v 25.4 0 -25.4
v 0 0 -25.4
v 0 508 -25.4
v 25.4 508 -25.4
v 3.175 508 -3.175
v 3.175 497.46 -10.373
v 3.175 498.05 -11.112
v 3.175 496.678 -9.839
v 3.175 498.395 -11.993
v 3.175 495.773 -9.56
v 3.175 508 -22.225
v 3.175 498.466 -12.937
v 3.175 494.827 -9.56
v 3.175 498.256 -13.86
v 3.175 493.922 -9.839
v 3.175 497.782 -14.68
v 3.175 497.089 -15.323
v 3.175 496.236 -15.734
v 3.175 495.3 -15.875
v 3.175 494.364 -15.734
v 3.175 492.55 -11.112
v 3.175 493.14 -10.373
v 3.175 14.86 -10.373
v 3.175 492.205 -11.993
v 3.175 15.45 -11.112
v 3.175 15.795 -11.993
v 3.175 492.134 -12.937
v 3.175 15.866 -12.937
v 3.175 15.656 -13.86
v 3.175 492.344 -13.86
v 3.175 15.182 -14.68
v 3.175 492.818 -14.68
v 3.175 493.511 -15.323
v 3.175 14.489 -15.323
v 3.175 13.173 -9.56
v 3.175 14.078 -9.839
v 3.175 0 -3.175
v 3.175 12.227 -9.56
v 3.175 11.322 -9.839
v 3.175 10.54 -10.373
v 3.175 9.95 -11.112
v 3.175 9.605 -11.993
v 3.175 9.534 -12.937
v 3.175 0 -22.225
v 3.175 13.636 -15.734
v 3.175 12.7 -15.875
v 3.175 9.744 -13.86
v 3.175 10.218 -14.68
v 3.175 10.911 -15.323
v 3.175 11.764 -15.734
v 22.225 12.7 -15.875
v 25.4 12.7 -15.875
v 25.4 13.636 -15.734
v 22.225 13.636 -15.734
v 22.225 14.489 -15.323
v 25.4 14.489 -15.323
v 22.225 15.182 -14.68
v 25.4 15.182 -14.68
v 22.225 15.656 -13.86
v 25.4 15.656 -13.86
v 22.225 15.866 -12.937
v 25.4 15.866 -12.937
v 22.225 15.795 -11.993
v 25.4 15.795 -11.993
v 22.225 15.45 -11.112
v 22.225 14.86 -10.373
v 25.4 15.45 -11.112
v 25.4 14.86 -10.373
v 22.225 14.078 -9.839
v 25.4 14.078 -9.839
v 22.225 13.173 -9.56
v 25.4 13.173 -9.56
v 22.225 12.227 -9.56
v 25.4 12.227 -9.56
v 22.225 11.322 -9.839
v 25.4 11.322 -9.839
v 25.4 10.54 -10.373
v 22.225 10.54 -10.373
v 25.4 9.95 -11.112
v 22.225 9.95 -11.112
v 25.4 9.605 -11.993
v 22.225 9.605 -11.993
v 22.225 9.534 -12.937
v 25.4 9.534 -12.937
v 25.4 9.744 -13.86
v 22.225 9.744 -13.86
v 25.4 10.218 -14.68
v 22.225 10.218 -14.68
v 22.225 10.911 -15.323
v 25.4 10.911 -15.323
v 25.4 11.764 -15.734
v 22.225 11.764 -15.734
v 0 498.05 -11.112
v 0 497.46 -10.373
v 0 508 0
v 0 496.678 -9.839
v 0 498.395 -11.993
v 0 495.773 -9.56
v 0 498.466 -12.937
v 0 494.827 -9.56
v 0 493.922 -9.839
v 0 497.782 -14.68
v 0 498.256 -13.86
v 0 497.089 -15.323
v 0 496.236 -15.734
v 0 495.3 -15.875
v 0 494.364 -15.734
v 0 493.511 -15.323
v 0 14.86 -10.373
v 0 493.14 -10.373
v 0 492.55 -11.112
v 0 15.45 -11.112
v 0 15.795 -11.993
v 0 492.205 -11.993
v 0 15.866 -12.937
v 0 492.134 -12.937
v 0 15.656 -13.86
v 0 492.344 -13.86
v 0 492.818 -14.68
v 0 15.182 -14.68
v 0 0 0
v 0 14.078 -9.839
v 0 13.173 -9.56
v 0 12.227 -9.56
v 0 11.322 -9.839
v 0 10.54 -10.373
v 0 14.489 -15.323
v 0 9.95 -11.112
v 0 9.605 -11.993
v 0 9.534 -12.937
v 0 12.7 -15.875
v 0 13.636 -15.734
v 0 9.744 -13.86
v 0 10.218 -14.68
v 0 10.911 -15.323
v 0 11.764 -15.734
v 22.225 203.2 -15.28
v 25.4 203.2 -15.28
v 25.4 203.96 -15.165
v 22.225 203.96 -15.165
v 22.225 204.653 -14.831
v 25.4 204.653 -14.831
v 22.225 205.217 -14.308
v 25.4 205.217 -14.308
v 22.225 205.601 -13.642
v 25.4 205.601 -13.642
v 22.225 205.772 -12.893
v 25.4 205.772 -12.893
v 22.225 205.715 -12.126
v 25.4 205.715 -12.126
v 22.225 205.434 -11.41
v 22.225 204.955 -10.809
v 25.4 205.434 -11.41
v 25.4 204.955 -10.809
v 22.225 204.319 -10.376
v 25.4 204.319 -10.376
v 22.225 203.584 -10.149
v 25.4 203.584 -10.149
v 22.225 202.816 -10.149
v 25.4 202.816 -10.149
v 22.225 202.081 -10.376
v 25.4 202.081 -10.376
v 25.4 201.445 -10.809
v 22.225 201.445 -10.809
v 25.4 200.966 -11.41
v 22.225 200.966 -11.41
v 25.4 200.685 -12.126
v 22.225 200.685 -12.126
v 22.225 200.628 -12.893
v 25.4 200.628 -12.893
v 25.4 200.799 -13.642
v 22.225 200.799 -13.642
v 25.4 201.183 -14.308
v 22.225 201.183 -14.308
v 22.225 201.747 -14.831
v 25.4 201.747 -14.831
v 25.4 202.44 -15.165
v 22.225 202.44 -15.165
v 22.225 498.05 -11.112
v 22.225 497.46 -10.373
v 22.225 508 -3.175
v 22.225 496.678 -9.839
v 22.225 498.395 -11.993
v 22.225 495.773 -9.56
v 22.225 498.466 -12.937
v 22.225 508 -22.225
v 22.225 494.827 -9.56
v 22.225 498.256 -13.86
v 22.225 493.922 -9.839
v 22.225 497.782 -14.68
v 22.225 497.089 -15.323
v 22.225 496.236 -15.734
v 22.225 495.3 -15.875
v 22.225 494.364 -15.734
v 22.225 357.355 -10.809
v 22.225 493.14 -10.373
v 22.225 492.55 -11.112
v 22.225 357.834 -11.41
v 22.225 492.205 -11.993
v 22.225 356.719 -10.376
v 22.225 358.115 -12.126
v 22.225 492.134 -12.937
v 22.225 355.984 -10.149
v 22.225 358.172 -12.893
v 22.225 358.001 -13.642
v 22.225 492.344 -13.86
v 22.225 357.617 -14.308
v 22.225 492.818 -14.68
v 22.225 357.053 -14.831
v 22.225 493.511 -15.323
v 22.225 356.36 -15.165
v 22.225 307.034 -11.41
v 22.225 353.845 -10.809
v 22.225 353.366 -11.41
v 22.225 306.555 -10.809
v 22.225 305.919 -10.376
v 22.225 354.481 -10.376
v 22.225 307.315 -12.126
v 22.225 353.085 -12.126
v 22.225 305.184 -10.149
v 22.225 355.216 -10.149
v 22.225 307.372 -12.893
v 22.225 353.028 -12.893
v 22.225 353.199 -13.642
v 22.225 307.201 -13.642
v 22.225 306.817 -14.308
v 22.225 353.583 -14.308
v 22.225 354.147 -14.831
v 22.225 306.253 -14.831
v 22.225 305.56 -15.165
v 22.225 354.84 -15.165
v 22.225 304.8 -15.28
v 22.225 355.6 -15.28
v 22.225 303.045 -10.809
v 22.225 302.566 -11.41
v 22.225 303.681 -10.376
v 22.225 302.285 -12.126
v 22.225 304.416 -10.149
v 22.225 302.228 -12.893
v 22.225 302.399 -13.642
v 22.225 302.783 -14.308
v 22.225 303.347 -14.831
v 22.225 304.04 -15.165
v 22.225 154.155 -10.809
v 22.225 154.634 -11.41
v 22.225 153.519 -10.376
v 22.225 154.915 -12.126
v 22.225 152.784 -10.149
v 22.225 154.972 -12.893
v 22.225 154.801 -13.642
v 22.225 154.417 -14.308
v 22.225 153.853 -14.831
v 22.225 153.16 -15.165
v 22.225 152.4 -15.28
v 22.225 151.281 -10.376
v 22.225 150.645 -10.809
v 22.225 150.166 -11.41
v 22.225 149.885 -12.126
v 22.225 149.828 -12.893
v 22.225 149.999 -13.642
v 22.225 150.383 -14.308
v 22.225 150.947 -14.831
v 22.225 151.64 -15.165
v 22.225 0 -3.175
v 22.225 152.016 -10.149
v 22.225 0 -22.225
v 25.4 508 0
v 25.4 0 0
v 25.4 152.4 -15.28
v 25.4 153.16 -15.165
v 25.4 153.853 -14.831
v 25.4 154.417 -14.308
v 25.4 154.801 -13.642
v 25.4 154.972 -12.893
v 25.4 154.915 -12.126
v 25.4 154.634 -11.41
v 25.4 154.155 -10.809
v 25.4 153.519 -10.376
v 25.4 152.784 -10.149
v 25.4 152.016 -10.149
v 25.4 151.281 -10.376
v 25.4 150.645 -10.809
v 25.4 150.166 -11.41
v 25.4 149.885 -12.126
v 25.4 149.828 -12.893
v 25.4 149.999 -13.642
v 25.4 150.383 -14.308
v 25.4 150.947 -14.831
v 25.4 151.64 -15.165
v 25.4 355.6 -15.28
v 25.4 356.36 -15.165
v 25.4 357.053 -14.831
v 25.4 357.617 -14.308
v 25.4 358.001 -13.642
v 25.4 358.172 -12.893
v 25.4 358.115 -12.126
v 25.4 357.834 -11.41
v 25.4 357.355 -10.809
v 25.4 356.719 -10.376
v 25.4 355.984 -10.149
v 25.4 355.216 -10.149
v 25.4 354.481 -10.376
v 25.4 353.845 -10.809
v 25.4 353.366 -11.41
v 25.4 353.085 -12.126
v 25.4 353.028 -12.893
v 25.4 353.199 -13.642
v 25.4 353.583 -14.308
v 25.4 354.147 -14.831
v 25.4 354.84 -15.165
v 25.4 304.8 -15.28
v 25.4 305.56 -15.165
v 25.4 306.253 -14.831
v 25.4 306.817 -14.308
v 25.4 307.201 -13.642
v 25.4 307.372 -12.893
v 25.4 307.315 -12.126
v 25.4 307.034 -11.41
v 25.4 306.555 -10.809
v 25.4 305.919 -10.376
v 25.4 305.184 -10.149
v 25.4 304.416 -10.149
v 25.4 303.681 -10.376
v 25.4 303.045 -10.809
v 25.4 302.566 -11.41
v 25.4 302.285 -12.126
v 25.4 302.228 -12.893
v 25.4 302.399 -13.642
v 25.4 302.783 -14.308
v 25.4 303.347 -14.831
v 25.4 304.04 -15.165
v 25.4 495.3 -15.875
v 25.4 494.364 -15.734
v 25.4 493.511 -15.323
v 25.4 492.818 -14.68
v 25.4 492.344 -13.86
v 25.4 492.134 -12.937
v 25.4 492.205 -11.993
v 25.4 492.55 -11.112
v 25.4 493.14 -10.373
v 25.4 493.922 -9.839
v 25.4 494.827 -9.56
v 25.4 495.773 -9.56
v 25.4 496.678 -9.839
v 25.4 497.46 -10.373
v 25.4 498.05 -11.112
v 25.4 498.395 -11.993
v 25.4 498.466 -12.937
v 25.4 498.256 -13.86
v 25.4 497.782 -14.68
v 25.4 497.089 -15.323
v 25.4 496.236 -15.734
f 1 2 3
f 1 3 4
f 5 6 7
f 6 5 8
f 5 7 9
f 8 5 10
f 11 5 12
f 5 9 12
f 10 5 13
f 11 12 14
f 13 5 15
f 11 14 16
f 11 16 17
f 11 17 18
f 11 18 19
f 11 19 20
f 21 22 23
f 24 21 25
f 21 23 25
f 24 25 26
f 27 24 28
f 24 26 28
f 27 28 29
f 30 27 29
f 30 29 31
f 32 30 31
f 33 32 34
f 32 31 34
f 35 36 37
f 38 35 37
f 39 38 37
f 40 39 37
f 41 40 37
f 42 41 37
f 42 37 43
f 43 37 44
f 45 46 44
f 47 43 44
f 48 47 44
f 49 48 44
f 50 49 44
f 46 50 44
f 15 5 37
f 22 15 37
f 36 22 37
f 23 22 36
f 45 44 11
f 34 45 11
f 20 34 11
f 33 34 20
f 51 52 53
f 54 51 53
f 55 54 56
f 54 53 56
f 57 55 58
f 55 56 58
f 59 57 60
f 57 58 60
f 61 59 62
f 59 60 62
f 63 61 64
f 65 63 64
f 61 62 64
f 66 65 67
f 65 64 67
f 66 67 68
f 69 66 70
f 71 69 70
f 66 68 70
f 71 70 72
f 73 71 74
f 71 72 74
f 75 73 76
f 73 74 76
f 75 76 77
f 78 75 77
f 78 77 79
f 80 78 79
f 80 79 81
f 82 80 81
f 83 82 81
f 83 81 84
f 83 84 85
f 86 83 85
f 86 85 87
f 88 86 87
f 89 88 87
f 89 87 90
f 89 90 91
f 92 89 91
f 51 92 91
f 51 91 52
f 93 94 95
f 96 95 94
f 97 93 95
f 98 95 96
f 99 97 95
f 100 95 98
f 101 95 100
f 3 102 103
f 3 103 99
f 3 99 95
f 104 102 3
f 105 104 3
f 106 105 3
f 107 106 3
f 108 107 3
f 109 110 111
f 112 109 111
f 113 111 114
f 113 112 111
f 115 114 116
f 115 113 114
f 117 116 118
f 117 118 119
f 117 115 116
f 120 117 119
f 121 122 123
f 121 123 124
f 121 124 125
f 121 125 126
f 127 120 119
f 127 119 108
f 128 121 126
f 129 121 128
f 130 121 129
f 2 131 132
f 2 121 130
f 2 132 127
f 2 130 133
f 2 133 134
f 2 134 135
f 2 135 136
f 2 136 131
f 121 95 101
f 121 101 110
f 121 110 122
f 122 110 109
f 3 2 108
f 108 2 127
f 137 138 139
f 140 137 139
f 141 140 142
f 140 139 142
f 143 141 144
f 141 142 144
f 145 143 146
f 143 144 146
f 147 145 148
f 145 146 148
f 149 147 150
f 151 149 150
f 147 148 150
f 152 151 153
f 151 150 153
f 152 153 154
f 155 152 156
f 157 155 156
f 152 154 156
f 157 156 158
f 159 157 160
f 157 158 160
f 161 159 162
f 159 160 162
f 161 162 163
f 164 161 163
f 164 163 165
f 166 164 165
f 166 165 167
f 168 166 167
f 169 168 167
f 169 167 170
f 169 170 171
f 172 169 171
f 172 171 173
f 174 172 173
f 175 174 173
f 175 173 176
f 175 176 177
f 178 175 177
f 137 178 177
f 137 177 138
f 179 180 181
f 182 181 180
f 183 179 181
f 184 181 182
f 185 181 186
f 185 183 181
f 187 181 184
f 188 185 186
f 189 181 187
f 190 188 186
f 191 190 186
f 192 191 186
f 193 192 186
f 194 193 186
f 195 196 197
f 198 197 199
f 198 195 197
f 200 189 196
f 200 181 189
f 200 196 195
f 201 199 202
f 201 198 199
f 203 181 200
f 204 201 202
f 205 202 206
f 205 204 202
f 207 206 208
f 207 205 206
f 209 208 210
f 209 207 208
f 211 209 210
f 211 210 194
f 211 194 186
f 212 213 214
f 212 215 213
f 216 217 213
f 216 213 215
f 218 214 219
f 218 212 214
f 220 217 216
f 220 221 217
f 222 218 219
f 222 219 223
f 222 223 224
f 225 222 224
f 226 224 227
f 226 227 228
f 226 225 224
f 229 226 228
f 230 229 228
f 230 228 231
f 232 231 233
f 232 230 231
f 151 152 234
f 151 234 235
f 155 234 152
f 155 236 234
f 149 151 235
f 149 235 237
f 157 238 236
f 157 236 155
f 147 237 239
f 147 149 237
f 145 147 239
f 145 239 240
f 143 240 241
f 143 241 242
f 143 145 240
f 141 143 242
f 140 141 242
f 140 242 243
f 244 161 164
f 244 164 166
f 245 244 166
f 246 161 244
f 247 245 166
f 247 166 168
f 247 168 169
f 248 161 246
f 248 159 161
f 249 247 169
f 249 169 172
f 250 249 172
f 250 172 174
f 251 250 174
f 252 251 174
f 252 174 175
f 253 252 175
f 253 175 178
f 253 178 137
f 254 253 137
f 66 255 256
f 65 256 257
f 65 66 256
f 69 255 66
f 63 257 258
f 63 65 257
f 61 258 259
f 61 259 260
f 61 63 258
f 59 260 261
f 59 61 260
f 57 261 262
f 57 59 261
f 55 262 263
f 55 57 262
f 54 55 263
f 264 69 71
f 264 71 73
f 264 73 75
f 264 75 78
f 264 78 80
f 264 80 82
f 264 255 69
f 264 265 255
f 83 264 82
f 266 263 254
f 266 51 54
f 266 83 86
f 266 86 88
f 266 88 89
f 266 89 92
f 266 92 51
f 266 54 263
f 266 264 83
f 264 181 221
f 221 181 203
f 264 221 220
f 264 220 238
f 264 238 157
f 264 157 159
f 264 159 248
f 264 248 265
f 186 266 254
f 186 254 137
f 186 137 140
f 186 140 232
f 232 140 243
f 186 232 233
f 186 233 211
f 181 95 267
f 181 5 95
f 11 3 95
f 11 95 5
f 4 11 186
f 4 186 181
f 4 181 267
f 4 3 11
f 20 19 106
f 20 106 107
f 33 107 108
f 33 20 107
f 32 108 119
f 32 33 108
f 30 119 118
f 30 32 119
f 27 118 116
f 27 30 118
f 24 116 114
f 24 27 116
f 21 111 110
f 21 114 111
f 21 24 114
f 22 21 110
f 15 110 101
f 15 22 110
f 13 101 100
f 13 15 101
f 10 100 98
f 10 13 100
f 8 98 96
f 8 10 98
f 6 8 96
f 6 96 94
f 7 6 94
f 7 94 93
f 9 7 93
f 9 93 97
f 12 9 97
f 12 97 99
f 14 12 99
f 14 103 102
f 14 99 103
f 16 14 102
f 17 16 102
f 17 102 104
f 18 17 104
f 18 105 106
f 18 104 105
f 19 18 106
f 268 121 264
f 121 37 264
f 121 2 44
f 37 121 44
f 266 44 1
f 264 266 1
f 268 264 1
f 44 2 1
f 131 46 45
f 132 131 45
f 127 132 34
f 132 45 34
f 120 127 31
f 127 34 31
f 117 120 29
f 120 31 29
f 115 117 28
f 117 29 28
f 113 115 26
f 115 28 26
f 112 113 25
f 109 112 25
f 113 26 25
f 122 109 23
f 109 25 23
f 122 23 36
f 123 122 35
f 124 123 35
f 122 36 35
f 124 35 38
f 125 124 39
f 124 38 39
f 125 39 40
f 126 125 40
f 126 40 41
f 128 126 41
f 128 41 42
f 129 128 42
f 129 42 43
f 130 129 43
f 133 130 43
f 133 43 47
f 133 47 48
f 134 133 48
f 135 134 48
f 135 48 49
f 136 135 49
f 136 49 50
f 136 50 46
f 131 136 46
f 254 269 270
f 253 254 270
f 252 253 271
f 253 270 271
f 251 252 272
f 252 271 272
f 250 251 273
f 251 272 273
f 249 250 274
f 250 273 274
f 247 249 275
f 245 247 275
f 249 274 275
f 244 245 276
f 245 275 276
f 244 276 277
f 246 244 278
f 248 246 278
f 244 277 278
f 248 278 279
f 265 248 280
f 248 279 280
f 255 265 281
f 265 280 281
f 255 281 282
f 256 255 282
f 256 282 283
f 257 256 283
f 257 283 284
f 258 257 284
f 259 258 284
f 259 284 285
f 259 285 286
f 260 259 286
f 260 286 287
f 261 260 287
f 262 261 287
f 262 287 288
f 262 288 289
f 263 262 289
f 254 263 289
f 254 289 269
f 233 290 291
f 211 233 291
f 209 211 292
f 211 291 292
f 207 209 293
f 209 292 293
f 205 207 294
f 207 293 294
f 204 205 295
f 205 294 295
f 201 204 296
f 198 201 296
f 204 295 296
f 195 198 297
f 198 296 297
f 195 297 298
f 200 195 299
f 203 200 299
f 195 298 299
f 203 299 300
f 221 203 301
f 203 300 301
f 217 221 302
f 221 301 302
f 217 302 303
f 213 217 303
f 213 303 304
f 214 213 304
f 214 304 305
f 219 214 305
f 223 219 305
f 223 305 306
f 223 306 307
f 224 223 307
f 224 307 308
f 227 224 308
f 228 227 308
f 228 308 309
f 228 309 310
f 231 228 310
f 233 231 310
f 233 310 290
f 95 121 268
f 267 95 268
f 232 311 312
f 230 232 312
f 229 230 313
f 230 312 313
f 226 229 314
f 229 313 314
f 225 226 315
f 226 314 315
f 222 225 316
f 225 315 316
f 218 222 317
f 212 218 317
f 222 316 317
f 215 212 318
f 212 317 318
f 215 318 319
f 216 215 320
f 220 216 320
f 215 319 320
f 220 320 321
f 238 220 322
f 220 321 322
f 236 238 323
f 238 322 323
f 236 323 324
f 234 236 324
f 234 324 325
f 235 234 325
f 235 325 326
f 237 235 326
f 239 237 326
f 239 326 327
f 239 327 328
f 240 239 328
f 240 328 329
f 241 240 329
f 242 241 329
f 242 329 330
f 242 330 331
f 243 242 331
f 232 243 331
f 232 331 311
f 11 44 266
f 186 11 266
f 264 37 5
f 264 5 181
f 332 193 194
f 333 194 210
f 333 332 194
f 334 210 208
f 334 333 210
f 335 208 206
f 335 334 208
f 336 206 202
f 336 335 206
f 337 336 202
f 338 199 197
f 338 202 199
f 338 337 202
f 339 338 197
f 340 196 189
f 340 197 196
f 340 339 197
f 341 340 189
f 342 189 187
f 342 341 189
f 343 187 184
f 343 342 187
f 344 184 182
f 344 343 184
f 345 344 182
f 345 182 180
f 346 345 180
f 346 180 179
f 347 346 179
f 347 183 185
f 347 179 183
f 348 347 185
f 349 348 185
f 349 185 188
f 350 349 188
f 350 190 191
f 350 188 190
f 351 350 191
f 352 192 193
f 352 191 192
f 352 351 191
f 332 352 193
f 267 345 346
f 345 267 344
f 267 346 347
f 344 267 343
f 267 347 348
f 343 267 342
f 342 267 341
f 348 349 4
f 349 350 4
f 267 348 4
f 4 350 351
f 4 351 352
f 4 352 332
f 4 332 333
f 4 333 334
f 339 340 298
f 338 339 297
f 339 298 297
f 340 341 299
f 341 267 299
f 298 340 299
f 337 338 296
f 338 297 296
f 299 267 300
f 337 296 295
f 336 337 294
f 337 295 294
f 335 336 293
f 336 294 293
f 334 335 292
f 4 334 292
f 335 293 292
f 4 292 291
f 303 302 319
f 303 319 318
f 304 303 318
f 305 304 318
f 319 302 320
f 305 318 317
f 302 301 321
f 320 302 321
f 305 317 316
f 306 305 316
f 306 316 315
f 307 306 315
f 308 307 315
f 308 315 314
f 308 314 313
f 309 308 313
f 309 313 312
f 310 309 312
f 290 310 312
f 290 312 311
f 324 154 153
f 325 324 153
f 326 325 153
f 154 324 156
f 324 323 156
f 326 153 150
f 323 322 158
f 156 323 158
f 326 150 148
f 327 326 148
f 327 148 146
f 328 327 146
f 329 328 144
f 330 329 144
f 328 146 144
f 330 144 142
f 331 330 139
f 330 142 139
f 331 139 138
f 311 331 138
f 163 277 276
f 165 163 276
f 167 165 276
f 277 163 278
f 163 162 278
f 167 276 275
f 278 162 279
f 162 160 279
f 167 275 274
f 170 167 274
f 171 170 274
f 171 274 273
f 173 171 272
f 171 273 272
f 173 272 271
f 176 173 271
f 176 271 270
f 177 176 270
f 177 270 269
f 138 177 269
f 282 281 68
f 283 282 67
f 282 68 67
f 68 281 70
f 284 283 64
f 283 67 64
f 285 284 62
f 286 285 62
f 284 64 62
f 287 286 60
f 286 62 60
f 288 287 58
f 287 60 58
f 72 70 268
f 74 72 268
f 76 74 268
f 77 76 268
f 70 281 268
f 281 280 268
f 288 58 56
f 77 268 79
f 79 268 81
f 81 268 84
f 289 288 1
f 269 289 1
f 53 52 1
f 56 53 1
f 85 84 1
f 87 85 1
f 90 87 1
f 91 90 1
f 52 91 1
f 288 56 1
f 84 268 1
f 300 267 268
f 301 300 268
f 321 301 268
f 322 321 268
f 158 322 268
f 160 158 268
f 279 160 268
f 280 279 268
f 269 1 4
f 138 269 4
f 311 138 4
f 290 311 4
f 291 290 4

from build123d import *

# Parameters (mm, degrees)
SKETCH1_W           = 25.4
SKETCH1_H           = 25.4
SKETCH1_W_2         = 19.05
SKETCH1_H_2         = 19.05
BOSS_EXTRUDE1_DEPTH = 508
SKETCH2_R           = 3.175
CUT_EXTRUDE1_DEPTH  = 510.268416456
CUT_EXTRUDE2_REACH  = 511.268
SKETCH3_R           = 2.5796875


with BuildPart() as part:
    # Sketch1 → Boss-Extrude1 (new body)
    with BuildSketch(Plane(origin=(0, 0, 0), x_dir=(1, 0, 0), z_dir=(0, 1, 0))):
        with Locations((12.7, 12.7)):
            Rectangle(SKETCH1_W, SKETCH1_H)
        with Locations((12.7, 12.7)):
            Rectangle(SKETCH1_W_2, SKETCH1_H_2, mode=Mode.SUBTRACT)
    extrude(amount=BOSS_EXTRUDE1_DEPTH)

    # Sketch2 → Cut-Extrude1 (cut, through all)
    with BuildSketch(Plane(origin=(25.4, 0, 0), x_dir=(0, 0, -1), z_dir=(1, 0, 0))):
        with Locations((12.7, 12.7)):
            Circle(SKETCH2_R)
    cut_extrude1 = extrude(amount=-CUT_EXTRUDE1_DEPTH, mode=Mode.SUBTRACT)

    # Mirror1: Cut-Extrude1 across plane
    add(cut_extrude1.mirror(Plane.ZX.offset(254)), mode=Mode.SUBTRACT)

    # Sketch3 → Cut-Extrude2 (cut, up to next)
    with BuildSketch(Plane(origin=(25.4, 0, 0), x_dir=(0, 0, -1), z_dir=(1, 0, 0)), mode=Mode.PRIVATE) as cut_extrude2_sk1:
        with Locations((12.7, 304.800000001)):
            Circle(SKETCH3_R)
    cut_extrude2_tool1 = extrude(cut_extrude2_sk1.sketch, amount=-CUT_EXTRUDE2_REACH, mode=Mode.PRIVATE) & part.part
    # Sketch3 → Cut-Extrude2 (cut, up to next)
    with BuildSketch(Plane(origin=(25.4, 0, 0), x_dir=(0, 0, -1), z_dir=(1, 0, 0)), mode=Mode.PRIVATE) as cut_extrude2_sk2:
        with Locations((12.7, 355.600000001)):
            Circle(SKETCH3_R)
    cut_extrude2_tool2 = extrude(cut_extrude2_sk2.sketch, amount=-CUT_EXTRUDE2_REACH, mode=Mode.PRIVATE) & part.part
    # Sketch3 → Cut-Extrude2 (cut, up to next)
    with BuildSketch(Plane(origin=(25.4, 0, 0), x_dir=(0, 0, -1), z_dir=(1, 0, 0)), mode=Mode.PRIVATE) as cut_extrude2_sk3:
        with Locations((12.7, 203.200000001)):
            Circle(SKETCH3_R)
    cut_extrude2_tool3 = extrude(cut_extrude2_sk3.sketch, amount=-CUT_EXTRUDE2_REACH, mode=Mode.PRIVATE) & part.part
    # Sketch3 → Cut-Extrude2 (cut, up to next)
    with BuildSketch(Plane(origin=(25.4, 0, 0), x_dir=(0, 0, -1), z_dir=(1, 0, 0)), mode=Mode.PRIVATE) as cut_extrude2_sk4:
        with Locations((12.7, 152.400000001)):
            Circle(SKETCH3_R)
    cut_extrude2_tool4 = extrude(cut_extrude2_sk4.sketch, amount=-CUT_EXTRUDE2_REACH, mode=Mode.PRIVATE) & part.part
    add(cut_extrude2_tool1.solids().sort_by_distance((25.4, 304.8, -12.7))[0], mode=Mode.SUBTRACT)
    add(cut_extrude2_tool2.solids().sort_by_distance((25.4, 355.6, -12.7))[0], mode=Mode.SUBTRACT)
    add(cut_extrude2_tool3.solids().sort_by_distance((25.4, 203.2, -12.7))[0], mode=Mode.SUBTRACT)
    add(cut_extrude2_tool4.solids().sort_by_distance((25.4, 152.4, -12.7))[0], mode=Mode.SUBTRACT)


solid = part.part
